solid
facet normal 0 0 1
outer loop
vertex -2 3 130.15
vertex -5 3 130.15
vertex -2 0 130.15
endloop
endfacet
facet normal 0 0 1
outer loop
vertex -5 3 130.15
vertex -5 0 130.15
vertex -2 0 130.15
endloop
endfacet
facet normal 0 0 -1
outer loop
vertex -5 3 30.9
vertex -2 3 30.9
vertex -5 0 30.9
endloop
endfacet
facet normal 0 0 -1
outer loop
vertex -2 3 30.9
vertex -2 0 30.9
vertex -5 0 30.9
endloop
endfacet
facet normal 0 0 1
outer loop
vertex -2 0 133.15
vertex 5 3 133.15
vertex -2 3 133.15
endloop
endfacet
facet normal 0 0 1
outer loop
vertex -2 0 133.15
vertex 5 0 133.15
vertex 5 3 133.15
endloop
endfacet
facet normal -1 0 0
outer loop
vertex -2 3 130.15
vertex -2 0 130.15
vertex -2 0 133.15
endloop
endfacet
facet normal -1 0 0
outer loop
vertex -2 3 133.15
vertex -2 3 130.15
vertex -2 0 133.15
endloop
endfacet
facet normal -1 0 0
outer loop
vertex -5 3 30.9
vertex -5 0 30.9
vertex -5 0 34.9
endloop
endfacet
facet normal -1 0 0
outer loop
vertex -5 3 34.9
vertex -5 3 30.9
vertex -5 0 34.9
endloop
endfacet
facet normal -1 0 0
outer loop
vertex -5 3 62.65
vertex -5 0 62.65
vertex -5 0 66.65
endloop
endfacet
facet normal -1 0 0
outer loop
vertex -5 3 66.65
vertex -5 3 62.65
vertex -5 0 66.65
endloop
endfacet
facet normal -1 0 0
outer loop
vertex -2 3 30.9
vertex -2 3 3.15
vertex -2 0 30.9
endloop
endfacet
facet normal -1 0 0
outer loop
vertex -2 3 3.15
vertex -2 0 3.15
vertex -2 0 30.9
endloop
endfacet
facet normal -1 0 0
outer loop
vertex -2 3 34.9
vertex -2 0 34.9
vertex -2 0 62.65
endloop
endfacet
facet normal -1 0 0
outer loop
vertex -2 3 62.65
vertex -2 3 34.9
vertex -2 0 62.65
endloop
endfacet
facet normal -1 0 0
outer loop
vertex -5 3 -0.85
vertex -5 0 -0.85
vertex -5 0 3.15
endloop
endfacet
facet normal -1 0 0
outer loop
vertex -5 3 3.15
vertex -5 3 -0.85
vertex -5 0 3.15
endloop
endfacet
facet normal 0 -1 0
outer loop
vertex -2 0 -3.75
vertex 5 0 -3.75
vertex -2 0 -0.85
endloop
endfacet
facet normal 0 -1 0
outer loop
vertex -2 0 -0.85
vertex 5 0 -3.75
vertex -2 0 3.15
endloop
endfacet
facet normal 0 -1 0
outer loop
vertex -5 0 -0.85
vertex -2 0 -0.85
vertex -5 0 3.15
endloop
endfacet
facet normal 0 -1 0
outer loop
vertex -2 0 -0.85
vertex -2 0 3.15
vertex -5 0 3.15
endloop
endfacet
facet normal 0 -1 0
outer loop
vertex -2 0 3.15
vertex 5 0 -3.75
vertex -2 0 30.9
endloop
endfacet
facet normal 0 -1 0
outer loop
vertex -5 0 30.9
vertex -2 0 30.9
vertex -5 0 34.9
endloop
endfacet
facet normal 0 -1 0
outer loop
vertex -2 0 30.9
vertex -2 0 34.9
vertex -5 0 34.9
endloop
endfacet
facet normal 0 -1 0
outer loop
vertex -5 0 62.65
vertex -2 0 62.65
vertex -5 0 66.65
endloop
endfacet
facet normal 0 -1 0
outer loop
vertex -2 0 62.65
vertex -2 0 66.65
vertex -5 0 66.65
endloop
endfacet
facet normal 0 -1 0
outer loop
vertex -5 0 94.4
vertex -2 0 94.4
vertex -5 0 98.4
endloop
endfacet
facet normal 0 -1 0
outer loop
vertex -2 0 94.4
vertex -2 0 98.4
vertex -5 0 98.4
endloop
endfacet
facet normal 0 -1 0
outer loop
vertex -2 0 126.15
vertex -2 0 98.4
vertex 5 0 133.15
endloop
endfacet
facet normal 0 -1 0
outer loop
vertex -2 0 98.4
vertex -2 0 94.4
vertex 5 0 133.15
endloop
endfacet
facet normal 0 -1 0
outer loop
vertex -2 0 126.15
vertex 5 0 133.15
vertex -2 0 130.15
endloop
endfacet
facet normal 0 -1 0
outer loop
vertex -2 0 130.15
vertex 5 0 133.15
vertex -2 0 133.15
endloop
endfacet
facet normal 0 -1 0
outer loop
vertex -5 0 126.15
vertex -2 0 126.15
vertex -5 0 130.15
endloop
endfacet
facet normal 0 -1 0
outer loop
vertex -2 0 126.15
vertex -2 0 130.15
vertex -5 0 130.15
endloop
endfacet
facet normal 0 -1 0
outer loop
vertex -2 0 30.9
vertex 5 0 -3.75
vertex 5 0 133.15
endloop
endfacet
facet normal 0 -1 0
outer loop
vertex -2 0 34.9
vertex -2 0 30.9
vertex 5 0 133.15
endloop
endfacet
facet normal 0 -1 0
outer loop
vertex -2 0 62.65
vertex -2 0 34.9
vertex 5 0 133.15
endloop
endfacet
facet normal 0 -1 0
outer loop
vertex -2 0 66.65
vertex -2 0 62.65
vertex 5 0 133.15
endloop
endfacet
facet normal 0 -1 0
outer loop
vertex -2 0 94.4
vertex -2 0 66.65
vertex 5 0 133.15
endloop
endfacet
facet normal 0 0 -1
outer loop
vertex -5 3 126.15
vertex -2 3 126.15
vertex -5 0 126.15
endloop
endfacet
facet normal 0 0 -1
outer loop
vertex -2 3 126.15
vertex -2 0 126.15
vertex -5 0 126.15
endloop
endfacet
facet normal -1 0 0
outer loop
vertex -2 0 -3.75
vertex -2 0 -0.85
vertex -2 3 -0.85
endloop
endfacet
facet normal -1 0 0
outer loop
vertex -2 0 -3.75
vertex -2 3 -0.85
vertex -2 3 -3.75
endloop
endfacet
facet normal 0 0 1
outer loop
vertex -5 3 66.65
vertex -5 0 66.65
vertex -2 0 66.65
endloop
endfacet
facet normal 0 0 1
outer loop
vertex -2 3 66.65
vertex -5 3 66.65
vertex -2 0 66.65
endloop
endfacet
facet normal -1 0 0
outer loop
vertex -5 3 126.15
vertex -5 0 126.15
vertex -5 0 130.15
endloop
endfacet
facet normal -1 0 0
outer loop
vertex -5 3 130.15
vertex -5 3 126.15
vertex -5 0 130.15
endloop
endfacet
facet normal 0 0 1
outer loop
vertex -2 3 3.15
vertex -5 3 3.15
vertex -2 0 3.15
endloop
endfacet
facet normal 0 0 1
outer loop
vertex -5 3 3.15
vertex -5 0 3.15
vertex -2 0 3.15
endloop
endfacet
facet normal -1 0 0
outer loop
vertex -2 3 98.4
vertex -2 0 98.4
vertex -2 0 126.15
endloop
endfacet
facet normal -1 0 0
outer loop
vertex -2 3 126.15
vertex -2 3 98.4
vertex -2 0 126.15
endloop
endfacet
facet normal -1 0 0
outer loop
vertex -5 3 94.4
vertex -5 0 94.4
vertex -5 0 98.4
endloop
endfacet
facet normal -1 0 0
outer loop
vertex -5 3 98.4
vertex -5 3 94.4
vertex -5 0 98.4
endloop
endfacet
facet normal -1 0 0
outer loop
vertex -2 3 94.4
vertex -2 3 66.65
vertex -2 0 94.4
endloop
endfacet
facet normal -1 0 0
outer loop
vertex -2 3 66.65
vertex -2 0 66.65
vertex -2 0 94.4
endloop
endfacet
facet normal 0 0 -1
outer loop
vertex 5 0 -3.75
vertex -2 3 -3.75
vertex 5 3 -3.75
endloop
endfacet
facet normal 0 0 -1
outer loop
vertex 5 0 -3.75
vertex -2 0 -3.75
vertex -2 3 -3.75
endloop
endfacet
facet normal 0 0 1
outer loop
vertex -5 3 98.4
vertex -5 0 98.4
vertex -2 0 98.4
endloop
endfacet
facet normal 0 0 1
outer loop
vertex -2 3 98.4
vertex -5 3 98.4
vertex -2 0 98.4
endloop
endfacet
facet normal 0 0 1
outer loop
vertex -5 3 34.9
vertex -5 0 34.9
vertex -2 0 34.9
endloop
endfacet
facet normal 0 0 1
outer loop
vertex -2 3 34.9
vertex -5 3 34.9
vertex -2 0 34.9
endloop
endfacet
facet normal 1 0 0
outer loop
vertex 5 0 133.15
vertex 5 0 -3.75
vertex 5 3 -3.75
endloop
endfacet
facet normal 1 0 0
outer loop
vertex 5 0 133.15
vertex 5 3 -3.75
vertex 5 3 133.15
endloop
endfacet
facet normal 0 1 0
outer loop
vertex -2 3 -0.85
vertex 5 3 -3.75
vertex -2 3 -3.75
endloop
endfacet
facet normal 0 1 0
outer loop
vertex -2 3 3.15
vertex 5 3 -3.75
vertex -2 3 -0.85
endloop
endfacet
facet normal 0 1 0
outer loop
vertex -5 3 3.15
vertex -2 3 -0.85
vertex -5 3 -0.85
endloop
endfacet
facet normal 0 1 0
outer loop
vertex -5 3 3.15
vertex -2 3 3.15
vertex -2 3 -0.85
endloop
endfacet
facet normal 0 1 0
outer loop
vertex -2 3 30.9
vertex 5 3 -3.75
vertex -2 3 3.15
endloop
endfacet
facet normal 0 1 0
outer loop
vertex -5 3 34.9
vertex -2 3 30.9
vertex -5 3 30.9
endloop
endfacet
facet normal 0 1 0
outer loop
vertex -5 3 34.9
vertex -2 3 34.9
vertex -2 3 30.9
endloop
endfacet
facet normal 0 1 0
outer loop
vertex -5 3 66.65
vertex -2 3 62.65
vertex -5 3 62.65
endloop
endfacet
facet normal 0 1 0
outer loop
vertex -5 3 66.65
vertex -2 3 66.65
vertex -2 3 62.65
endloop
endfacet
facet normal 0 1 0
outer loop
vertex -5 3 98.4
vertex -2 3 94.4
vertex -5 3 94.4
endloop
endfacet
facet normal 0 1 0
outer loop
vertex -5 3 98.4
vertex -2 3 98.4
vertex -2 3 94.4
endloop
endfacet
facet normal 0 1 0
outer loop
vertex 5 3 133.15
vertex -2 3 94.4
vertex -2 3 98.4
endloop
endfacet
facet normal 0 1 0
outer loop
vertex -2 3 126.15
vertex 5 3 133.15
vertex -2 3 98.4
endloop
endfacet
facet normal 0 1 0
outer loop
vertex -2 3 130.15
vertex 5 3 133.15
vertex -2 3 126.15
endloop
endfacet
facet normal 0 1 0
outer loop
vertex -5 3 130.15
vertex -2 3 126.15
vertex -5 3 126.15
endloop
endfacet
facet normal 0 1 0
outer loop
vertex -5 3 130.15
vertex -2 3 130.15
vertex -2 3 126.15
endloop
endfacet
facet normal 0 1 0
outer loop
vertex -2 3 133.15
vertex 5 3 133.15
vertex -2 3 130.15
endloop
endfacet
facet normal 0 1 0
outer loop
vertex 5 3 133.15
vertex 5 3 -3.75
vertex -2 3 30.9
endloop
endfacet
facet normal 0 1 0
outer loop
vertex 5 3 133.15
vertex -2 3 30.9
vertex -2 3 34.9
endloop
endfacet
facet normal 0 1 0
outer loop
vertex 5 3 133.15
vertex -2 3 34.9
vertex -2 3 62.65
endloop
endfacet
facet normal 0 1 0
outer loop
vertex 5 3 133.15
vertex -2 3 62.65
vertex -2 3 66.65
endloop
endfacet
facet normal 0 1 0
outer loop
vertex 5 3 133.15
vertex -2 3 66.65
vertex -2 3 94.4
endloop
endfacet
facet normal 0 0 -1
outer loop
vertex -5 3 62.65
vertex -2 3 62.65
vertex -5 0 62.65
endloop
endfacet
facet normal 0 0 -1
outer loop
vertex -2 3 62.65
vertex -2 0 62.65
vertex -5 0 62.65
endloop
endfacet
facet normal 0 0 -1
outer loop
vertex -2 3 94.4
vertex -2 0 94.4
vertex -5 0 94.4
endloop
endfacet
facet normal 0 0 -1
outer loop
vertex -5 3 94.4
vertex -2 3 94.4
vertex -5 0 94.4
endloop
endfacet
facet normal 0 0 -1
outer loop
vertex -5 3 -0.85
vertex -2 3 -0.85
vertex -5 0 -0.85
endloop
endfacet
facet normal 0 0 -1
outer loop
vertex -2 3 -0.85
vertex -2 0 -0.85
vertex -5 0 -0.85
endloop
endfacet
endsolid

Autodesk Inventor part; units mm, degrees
ref_plane "YZ Plane" through (0, 0, 0) normal (1, 0, 0) x (0, 1, 0)
ref_plane "XZ Plane" through (0, 0, 0) normal (0, 1, 0) x (-1, 0, 0)
ref_plane "XY Plane" through (0, 0, 0) normal (0, 0, 1) x (1, 0, 0)
sketch "Sketch1" plane through (0, 0, 0) normal (0, 1, 0) x (-1, 0, 0)
  line L0 (2, -0.85) -> (2, -3.75)
  line L1 (-5, 133.15) -> (2, 133.15)
  line L2 (-5, -3.75) -> (-5, 133.15)
  line L3 (2, -0.85) -> (5, -0.85)
  line L4 (5, -0.85) -> (5, 3.15)
  line L5 (5, 3.15) -> (2, 3.15)
  line L6 (2, 30.9) -> (5, 30.9)
  line L7 (5, 30.9) -> (5, 34.9)
  line L8 (5, 34.9) -> (2, 34.9)
  line L9 (2, 62.65) -> (5, 62.65)
  line L10 (5, 62.65) -> (5, 66.65)
  line L11 (5, 66.65) -> (2, 66.65)
  line L12 (2, 94.4) -> (5, 94.4)
  line L13 (5, 94.4) -> (5, 98.4)
  line L14 (5, 98.4) -> (2, 98.4)
  line L15 (2, 3.15) -> (2, 30.9)
  line L16 (2, 34.9) -> (2, 62.65)
  line L17 (2, 66.65) -> (2, 94.4)
  line L18 (2, 126.15) -> (5, 126.15)
  line L19 (5, 126.15) -> (5, 130.15)
  line L20 (5, 130.15) -> (2, 130.15)
  line L21 (2, 98.4) -> (2, 126.15)
  line L22 (2, -0.85) -> (2, -3.75)
  line L23 (2, -3.75) -> (-5, -3.75)
  line L24 (2, 130.15) -> (2, 133.15)
  point P0 (0, 0)
  point P1 (2, 133.15)
  dimension "d35" = 3
  dimension "d36" = 4
  dimension "d46" = 90
  dimension "d52" = 31.75
  dimension "d57" = 2.9
extrude "Extrusion1" add sketch "Sketch1" along normal blind 3
sketch "Sketch4" plane through (0, 3, 0) normal (0, 1, 0) x (1, 0, 0)
  line L0 (1.7141, -13.1698) -> (0.2738, -13.1698)
  line L1 (0.2738, -13.1698) -> (0.2738, -8.8733)
  line L2 (0.2738, -8.8733) -> (-0.6051, -8.8733)
  line L3 (-0.6051, -8.8733) -> (0.9939, -7.2743)
  line L4 (0.9939, -7.2743) -> (2.5929, -8.8733)
  line L5 (1.7141, -13.1698) -> (1.7141, -8.8733)
  line L6 (1.7141, -8.8733) -> (2.5929, -8.8733)
properties part number "steun" material "Wood (Maple)"
